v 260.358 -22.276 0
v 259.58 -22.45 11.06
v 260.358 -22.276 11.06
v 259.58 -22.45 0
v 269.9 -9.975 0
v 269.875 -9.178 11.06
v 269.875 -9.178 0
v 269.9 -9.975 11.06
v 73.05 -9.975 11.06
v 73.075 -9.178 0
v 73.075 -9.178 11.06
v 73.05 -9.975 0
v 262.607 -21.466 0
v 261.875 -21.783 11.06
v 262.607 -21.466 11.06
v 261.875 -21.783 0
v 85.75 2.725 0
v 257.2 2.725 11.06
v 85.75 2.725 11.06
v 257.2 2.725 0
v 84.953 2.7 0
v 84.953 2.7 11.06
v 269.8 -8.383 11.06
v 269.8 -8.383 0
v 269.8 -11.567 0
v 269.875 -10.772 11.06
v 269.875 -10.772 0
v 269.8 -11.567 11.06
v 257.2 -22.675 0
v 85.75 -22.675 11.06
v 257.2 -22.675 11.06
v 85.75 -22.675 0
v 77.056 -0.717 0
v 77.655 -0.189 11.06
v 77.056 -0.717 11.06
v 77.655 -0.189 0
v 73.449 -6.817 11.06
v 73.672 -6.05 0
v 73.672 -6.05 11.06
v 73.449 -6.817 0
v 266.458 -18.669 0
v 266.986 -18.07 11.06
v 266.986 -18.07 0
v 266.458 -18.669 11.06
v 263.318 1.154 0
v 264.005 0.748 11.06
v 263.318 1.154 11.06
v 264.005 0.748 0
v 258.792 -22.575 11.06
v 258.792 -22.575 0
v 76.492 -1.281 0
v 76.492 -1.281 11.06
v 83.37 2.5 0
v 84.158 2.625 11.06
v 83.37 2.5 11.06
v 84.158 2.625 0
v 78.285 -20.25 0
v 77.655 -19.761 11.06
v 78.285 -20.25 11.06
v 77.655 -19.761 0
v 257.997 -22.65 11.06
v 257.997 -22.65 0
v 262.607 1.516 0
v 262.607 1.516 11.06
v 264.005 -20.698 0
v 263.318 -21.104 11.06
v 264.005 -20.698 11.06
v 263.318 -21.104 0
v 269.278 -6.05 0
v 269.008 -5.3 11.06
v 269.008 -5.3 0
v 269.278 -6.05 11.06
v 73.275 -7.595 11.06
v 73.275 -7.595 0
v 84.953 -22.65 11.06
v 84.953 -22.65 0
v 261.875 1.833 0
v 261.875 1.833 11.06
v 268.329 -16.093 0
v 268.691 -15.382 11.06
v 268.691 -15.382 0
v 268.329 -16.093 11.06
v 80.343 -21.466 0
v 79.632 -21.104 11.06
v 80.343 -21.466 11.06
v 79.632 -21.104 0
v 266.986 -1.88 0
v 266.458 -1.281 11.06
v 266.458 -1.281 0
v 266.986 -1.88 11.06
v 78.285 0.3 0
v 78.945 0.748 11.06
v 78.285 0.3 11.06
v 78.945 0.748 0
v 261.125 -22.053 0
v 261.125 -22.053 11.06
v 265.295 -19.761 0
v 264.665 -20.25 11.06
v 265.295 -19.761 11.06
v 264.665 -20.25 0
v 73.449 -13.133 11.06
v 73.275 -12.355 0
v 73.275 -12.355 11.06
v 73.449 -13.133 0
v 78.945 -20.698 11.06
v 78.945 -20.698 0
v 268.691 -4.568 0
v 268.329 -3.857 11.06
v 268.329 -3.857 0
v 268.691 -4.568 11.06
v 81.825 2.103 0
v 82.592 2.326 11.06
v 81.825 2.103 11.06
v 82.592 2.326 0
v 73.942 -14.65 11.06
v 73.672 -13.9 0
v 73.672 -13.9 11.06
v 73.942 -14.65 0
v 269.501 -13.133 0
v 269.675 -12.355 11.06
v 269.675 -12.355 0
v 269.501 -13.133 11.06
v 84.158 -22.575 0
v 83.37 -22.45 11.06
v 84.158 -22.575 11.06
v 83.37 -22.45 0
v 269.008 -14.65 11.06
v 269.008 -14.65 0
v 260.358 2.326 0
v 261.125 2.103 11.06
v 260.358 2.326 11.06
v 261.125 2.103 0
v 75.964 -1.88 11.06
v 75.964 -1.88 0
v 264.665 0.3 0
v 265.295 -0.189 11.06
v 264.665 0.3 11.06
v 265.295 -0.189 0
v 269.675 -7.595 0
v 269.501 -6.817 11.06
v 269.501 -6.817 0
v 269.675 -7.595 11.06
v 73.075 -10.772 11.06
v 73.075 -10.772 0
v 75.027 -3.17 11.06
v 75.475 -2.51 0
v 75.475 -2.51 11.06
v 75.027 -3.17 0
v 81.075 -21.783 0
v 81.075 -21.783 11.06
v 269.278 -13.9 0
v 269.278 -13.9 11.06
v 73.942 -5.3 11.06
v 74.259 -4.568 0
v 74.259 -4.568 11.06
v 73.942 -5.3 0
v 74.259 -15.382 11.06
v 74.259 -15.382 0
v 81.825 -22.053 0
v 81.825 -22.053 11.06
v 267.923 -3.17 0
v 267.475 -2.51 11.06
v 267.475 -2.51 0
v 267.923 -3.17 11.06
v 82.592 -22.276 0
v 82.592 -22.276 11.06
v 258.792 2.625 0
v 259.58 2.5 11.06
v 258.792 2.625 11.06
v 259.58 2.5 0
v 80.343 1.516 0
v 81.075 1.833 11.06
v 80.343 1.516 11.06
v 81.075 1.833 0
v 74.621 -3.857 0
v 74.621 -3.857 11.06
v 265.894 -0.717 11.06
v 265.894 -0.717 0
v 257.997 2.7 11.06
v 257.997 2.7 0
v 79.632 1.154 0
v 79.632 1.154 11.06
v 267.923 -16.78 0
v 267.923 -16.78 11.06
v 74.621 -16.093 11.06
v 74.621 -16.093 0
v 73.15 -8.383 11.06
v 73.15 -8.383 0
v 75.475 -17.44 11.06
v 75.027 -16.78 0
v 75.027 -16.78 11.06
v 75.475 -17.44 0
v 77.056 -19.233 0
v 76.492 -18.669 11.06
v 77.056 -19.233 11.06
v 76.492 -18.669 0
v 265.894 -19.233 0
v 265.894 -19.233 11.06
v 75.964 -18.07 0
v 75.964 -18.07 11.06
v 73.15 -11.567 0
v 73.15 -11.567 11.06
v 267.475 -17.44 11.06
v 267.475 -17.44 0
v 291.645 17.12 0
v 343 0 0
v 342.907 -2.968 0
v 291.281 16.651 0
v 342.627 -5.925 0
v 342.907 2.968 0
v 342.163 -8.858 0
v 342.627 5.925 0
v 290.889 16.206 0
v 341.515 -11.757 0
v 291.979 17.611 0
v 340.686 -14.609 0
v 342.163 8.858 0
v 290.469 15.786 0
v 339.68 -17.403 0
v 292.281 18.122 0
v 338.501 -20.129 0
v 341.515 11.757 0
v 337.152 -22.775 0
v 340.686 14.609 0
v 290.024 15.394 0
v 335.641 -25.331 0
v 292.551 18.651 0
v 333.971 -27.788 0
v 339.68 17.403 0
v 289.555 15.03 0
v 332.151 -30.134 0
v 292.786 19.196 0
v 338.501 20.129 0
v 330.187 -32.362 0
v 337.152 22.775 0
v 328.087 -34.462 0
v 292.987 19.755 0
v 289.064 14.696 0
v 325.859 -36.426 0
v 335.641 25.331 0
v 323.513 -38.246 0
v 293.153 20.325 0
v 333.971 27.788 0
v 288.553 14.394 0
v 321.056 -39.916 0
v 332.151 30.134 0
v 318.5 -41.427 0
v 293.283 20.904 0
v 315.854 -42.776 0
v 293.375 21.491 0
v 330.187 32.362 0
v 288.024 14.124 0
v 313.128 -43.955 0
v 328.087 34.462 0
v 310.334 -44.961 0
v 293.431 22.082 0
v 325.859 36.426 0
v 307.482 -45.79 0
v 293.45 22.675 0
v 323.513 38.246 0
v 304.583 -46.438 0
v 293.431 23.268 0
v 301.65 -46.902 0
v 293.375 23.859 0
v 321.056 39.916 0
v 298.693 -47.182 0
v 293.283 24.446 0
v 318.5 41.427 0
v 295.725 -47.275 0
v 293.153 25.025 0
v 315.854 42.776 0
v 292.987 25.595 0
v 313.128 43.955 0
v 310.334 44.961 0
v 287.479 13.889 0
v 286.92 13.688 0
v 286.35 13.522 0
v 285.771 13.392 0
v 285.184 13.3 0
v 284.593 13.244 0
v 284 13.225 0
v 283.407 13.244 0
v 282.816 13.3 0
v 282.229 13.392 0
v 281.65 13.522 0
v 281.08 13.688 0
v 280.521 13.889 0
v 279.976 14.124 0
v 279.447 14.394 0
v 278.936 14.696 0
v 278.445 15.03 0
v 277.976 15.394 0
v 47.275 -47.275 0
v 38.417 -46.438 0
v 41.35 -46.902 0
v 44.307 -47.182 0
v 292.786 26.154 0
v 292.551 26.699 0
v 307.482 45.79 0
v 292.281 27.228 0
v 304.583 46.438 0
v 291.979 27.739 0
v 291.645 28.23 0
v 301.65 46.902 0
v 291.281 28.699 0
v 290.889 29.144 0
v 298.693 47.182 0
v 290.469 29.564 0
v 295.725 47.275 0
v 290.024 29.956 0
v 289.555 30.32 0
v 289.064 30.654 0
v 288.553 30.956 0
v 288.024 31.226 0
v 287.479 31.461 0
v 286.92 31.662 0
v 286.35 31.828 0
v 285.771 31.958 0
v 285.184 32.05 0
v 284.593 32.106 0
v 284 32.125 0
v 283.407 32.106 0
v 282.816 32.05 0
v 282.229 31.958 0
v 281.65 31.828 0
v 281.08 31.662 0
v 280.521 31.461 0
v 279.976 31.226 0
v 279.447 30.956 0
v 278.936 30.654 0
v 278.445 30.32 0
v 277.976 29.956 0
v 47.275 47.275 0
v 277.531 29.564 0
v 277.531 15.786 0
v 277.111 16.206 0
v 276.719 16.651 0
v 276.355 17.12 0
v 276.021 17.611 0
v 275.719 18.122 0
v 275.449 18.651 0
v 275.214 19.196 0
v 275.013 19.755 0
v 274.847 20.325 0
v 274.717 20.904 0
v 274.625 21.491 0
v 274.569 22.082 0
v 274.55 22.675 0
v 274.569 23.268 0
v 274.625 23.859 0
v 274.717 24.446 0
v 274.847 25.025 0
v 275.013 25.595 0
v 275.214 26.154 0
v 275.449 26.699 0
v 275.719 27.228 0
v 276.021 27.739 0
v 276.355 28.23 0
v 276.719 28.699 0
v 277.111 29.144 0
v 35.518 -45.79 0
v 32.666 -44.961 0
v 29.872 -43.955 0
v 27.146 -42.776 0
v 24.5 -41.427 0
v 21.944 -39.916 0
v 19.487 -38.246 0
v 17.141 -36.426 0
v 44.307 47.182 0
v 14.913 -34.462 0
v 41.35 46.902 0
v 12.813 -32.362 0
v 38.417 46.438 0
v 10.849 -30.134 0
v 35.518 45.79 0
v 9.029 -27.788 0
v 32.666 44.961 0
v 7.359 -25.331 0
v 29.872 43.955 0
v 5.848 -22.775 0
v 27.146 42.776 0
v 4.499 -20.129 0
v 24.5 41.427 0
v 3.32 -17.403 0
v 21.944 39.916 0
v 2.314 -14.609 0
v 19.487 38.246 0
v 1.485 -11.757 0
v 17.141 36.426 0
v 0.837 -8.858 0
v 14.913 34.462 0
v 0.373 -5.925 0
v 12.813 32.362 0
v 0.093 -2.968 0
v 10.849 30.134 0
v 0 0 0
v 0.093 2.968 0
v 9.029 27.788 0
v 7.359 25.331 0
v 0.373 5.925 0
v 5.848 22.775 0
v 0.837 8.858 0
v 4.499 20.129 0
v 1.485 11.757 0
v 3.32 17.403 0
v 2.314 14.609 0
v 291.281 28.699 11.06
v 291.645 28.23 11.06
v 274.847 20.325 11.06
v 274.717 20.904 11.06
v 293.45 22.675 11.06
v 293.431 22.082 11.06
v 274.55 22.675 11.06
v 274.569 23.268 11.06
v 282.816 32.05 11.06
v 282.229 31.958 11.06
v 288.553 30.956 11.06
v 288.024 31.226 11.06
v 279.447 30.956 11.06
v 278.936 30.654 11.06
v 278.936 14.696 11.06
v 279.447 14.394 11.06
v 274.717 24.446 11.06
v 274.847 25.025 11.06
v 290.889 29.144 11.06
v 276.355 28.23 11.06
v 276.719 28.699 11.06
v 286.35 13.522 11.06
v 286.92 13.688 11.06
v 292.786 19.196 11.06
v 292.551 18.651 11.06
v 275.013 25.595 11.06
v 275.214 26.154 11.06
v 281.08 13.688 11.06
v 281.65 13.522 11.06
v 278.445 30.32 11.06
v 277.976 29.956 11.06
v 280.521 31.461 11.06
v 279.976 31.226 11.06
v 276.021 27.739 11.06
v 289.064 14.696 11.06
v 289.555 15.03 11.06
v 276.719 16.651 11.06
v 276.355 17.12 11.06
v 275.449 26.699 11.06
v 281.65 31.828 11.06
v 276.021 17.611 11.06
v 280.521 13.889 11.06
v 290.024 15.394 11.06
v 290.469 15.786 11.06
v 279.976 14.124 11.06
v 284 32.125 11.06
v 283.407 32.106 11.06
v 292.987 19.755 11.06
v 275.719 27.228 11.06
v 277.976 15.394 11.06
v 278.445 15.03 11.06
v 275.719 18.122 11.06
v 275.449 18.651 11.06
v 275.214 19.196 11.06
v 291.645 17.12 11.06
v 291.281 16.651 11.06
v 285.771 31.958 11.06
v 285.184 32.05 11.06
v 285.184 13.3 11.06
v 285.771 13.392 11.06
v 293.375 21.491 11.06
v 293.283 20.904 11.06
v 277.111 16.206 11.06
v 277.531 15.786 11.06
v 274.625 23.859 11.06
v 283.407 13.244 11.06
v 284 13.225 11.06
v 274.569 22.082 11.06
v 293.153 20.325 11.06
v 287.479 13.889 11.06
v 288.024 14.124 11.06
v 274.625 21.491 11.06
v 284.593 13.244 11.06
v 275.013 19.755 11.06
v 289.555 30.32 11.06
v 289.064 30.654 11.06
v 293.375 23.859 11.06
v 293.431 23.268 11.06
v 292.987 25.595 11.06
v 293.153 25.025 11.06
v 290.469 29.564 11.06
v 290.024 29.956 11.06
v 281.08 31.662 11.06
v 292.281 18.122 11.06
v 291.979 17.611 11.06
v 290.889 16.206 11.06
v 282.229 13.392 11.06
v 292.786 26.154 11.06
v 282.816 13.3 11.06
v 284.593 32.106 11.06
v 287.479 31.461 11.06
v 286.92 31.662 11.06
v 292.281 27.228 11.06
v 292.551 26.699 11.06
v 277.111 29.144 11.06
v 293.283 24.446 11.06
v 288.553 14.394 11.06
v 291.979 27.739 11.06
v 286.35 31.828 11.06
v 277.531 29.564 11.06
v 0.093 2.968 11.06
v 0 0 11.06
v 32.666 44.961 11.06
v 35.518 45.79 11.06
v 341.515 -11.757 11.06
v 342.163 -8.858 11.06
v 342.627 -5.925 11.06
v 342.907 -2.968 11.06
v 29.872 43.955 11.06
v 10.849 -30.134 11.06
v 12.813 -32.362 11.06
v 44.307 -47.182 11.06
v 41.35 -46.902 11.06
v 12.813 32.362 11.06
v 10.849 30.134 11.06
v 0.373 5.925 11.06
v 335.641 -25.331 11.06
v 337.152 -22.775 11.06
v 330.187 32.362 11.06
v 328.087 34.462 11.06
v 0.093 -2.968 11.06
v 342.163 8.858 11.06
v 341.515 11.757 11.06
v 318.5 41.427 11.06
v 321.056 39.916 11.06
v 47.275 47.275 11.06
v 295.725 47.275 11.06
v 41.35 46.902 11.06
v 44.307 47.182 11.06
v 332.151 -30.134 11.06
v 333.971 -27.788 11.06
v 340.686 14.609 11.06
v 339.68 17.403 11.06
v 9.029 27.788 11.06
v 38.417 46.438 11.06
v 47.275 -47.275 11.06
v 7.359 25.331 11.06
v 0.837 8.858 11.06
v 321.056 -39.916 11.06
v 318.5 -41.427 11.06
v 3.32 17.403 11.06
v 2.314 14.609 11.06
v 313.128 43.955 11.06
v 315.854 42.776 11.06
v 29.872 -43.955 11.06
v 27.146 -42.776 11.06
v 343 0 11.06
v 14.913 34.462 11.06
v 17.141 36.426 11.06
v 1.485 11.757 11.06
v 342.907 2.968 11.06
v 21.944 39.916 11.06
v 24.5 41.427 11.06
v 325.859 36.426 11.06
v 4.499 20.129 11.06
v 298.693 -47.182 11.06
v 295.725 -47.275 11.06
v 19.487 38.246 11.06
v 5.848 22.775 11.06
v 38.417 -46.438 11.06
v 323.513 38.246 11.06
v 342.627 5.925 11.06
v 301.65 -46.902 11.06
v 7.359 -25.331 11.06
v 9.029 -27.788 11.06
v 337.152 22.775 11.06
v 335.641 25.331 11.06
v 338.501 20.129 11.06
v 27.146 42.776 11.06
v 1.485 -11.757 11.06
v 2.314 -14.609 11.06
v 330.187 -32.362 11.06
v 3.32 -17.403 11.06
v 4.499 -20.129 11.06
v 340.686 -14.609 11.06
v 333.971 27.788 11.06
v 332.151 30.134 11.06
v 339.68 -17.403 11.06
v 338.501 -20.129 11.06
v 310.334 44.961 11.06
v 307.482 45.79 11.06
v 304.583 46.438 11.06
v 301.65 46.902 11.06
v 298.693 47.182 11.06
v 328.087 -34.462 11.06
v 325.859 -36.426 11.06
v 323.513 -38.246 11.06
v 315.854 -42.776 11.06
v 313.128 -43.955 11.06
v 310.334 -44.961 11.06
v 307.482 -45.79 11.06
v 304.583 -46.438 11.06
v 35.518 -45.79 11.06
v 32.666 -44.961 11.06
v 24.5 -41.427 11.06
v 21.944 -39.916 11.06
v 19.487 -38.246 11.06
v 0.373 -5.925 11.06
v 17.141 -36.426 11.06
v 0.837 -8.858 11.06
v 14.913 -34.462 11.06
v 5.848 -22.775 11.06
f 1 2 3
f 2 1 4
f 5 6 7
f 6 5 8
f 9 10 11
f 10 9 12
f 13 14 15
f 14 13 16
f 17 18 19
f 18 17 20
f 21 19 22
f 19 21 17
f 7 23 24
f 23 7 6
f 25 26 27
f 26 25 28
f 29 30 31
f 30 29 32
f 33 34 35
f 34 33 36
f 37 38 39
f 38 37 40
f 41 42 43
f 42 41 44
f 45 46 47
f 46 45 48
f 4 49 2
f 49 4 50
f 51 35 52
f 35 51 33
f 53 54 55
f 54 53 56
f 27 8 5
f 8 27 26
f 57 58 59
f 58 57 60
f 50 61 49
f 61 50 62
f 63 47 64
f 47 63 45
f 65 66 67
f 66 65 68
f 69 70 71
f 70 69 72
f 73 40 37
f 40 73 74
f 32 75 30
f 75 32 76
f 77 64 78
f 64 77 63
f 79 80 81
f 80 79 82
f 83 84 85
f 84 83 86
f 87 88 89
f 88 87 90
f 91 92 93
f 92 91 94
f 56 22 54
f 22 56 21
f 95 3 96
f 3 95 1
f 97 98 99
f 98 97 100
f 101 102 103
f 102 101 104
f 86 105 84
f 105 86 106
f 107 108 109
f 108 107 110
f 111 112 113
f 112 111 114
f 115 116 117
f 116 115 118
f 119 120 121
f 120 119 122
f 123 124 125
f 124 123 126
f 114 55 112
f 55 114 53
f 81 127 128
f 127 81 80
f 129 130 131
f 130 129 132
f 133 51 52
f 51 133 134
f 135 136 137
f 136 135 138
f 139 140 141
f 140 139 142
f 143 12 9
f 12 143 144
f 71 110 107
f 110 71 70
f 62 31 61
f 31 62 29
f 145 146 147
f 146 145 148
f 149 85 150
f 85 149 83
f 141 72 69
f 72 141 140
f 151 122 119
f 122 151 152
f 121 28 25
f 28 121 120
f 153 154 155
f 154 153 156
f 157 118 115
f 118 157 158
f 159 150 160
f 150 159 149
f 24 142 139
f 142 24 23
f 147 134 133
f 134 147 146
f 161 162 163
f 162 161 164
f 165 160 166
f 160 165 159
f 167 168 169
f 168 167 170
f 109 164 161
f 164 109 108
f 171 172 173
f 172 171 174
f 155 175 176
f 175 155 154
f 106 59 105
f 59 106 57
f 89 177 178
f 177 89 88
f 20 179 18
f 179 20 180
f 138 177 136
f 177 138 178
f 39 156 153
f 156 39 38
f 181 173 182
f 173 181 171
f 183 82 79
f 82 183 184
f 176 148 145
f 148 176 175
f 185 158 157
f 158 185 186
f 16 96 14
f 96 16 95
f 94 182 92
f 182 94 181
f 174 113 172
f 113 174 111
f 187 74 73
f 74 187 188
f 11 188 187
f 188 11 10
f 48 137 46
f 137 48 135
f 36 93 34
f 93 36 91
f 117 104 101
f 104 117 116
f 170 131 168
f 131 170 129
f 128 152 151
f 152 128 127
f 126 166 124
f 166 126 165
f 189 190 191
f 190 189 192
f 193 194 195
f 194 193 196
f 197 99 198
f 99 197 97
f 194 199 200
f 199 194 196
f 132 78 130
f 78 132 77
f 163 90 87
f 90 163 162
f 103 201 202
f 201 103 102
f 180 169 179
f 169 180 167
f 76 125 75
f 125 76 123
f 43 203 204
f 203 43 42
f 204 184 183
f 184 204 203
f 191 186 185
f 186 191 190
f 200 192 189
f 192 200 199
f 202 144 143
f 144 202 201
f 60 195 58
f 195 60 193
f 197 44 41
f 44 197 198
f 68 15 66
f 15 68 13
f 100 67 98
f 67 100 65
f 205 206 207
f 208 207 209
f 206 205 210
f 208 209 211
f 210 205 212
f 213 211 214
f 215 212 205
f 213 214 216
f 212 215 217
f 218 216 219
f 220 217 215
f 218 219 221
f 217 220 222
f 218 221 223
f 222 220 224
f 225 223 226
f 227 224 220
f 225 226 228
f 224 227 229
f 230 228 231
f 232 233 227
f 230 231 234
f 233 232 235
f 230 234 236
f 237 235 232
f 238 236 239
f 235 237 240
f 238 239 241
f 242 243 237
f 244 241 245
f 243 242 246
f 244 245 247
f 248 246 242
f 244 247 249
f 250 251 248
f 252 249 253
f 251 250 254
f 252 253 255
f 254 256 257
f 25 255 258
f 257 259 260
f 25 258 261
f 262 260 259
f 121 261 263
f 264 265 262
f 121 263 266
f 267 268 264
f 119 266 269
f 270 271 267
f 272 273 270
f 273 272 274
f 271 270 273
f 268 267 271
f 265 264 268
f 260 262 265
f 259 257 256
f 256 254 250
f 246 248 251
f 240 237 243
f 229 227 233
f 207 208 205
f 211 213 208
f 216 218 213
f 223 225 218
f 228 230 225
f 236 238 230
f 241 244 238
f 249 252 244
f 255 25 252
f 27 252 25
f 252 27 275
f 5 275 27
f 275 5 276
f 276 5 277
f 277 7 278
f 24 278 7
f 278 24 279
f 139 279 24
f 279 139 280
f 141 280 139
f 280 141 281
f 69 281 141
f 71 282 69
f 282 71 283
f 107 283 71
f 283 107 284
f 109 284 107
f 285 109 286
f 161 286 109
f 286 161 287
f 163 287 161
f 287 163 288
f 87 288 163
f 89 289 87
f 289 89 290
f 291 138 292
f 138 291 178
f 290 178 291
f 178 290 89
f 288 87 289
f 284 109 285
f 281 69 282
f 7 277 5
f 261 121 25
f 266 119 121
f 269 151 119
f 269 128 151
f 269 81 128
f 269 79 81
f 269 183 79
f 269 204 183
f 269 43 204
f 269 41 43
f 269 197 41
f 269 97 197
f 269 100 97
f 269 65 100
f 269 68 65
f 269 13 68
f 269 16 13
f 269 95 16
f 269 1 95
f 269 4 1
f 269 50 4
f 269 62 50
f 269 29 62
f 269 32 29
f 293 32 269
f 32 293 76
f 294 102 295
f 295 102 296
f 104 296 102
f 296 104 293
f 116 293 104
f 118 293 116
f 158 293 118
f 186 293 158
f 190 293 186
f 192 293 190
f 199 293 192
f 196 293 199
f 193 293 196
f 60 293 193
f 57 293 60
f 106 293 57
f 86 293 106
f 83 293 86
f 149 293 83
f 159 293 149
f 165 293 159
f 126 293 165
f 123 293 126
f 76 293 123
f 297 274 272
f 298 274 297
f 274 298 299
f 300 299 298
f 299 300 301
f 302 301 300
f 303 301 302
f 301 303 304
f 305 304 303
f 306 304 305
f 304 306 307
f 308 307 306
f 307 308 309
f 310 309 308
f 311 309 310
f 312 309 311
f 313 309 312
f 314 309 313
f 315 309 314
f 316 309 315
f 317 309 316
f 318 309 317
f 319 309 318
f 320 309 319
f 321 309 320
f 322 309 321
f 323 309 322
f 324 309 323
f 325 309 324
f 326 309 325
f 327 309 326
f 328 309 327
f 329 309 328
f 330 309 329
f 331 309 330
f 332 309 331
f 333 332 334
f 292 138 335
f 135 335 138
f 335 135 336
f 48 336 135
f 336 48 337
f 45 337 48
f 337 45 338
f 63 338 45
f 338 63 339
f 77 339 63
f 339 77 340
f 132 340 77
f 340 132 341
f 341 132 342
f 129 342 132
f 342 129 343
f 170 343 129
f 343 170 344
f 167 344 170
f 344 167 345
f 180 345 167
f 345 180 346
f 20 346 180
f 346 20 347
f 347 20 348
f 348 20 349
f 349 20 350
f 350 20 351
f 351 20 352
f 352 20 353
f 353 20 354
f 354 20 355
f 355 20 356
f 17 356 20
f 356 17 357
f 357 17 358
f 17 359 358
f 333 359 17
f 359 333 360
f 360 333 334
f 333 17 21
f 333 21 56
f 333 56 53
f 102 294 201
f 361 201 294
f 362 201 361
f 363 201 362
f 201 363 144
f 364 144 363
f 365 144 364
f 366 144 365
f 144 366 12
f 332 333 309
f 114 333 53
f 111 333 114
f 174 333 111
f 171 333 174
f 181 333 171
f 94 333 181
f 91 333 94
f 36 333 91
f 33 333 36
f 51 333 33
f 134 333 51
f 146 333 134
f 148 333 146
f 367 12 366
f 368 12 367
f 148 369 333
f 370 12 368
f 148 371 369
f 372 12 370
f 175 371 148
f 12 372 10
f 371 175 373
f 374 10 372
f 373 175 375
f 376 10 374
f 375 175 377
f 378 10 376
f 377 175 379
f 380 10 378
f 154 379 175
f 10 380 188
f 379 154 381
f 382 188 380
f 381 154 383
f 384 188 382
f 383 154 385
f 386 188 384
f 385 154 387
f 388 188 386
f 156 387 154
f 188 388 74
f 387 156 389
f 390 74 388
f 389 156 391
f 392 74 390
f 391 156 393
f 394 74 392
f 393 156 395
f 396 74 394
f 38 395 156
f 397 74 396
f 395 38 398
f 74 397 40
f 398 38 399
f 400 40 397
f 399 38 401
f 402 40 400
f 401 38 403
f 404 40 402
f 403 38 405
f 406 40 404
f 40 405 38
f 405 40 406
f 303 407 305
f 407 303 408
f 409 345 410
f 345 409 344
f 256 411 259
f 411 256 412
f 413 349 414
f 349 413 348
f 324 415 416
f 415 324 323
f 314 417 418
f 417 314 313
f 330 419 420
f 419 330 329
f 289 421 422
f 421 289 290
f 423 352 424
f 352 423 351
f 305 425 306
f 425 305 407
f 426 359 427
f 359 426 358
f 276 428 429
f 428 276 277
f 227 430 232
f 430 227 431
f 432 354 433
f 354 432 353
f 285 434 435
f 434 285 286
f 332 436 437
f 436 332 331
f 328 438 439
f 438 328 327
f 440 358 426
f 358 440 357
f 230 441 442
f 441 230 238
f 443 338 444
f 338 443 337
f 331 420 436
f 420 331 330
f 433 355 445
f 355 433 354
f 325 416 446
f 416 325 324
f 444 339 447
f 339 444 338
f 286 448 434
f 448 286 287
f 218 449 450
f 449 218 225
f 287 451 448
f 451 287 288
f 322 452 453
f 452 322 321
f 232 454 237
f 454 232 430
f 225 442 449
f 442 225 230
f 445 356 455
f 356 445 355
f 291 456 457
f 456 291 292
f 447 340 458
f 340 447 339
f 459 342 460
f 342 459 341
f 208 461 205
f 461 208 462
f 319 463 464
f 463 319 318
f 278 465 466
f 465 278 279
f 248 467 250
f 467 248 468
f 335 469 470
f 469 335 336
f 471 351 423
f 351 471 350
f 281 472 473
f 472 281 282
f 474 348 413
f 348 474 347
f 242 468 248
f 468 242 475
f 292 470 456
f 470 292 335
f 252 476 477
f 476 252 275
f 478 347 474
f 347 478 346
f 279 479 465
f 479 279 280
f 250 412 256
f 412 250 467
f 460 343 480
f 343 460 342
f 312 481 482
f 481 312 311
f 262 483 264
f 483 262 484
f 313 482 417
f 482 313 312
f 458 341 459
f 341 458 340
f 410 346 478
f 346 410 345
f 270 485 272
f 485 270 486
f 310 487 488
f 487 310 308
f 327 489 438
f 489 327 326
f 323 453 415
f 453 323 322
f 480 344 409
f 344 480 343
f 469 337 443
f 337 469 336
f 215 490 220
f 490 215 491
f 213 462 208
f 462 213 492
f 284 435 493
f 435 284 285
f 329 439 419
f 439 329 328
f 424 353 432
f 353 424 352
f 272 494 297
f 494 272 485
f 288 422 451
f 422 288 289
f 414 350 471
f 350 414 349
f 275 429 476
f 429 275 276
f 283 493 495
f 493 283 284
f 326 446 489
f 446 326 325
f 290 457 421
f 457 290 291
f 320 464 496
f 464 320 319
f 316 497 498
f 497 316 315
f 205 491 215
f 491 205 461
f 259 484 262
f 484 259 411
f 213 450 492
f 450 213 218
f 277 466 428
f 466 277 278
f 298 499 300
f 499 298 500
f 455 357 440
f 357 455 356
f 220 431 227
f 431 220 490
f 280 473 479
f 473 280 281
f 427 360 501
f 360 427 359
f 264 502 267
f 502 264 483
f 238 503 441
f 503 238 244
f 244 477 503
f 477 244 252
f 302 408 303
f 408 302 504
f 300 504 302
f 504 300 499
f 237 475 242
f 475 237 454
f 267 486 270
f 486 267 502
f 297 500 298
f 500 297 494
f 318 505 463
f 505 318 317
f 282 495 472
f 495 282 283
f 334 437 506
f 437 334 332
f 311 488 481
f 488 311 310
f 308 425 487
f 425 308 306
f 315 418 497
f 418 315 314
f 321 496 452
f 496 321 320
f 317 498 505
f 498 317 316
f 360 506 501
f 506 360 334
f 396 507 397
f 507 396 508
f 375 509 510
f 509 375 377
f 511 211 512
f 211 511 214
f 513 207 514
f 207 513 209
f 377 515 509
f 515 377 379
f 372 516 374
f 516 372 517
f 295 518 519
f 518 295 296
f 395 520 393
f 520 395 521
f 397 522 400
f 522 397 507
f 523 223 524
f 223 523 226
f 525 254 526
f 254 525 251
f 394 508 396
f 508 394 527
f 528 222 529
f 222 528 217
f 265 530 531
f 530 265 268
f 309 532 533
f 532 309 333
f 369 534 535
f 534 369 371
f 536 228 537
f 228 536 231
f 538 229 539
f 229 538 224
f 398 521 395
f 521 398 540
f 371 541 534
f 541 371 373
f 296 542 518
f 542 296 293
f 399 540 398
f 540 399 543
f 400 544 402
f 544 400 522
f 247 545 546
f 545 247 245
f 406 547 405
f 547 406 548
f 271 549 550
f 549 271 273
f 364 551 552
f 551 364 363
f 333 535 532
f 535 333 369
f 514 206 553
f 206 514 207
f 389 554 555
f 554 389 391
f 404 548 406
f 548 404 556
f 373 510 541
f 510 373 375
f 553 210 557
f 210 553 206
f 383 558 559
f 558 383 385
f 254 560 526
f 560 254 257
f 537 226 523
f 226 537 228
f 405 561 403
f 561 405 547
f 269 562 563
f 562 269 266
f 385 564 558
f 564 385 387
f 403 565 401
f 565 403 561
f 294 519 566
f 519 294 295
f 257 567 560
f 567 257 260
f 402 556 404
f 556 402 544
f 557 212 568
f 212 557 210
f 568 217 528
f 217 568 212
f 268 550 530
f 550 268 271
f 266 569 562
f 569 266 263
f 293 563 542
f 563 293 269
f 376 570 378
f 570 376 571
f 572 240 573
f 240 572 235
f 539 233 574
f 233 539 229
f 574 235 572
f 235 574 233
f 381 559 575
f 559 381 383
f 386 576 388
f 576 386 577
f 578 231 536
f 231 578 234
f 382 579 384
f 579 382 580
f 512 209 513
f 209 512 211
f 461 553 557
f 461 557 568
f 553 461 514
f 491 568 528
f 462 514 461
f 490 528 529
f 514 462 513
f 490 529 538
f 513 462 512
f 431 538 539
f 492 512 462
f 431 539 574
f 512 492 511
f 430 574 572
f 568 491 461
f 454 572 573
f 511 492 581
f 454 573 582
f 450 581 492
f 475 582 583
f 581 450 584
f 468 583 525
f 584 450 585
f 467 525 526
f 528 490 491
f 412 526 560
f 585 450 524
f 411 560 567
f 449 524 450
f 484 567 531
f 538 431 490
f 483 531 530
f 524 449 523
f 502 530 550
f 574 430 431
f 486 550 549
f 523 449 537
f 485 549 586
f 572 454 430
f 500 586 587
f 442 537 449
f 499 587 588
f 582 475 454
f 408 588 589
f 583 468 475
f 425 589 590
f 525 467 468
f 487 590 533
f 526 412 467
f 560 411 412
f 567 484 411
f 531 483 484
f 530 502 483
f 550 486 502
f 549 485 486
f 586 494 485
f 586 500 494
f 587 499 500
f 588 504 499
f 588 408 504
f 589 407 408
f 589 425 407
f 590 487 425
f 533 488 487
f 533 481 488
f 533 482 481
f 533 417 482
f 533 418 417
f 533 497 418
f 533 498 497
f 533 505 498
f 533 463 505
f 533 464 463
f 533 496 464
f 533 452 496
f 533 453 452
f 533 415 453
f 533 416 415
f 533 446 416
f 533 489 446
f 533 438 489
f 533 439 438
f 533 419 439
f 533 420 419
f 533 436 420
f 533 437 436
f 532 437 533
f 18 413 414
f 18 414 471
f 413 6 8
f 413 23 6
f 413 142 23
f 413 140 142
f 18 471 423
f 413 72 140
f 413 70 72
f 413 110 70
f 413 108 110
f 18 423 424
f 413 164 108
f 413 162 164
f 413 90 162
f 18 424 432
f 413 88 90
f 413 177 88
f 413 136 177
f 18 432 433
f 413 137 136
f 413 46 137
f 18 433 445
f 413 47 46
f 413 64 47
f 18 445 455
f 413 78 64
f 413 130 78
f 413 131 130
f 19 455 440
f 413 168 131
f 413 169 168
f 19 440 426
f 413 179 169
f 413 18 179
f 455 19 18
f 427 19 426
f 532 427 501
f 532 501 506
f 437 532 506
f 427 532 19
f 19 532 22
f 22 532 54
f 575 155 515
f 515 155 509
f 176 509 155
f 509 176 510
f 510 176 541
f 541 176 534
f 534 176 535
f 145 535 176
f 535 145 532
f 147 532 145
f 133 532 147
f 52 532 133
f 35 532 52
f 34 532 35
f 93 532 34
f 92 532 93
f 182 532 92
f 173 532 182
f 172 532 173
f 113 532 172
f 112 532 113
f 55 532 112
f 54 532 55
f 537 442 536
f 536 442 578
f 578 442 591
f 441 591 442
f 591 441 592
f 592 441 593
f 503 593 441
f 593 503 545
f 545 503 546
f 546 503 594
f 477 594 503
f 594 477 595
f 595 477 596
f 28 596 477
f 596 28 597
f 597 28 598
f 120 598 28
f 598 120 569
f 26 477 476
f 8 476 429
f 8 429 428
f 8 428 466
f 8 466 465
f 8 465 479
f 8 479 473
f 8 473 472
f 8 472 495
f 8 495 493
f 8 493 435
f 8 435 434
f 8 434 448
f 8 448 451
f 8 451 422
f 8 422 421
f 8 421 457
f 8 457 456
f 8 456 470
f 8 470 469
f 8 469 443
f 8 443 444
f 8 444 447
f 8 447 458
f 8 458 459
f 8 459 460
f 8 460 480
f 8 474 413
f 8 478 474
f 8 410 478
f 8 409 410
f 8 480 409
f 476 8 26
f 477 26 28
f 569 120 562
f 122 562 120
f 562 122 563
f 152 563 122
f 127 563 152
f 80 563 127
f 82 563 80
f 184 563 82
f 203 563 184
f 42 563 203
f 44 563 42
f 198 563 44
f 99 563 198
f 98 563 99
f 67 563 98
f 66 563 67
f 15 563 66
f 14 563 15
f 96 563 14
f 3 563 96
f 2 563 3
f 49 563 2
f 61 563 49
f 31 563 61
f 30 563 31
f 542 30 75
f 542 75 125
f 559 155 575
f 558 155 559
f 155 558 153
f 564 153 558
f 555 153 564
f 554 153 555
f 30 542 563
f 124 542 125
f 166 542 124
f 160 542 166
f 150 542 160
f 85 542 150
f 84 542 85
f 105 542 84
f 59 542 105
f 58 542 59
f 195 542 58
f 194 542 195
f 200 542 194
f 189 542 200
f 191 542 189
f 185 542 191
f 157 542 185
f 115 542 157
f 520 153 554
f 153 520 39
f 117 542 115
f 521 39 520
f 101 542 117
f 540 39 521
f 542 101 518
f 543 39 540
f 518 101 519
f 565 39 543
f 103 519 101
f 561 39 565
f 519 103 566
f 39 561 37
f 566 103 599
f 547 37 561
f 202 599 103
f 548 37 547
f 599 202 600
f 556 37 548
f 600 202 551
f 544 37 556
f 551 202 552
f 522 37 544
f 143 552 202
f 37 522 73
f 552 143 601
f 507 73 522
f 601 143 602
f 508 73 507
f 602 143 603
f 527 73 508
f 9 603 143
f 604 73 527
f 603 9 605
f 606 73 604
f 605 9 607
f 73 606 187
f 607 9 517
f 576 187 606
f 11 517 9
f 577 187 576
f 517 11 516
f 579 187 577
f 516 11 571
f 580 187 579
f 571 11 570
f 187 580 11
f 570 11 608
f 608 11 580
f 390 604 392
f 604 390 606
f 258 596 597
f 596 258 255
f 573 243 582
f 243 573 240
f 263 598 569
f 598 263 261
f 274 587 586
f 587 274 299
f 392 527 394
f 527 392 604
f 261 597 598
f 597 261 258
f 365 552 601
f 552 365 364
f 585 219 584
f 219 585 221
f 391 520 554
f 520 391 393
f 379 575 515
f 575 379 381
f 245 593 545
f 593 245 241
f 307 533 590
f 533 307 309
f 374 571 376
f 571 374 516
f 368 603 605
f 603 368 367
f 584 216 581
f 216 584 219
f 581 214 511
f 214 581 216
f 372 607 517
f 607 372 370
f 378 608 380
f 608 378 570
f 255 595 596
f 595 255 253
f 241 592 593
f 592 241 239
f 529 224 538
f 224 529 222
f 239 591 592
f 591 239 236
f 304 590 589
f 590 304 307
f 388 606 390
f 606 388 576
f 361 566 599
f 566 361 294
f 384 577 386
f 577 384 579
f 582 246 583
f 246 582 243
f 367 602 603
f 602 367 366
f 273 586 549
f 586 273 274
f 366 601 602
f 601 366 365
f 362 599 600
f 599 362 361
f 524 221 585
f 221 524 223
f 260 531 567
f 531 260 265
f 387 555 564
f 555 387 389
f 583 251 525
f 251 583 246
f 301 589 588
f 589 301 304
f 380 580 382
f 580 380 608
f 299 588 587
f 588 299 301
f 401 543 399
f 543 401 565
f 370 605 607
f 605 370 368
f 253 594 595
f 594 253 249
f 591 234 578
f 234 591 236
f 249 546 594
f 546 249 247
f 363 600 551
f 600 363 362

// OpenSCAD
// file: convert.scad
/*
    Library of useful converters.
    note put any constants in constants.scad
*/
include <constants.scad>;

// mmPerInch = 25.4;
// cmPerInch = mmPerInch/10;
// inchesInFoot = 12;
// FeetInInch = 1/inchesInFoot;
//imperial <-> meteric
function convert_ft2in(ft) = ft * inchesInFoot;
function convert_in2ft(in) = in * FeetInInch;
function convert_in2mm(in) = in * mmPerInch;
function convert_ft2mm(ft) = convert_ft2in(ft) * mmPerInch;
// function convert_ft2in(ft) = ft*12;
function convert_mm2Inch(mm) = mm/mmPerInch;
function convertV_mm2Inch(mm) = 
    [
        for(i = [0 : 1 : len(mm)-1]) convert_mm2Inch(mm[i])
    ];

function convert_mm2ft(mm) = convert_in2ft(in = convert_mm2Inch(mm));
function convert_feet2feet(ft) = ft;
function convert_in2in(in) = in;

function convertV_mm2Feet(mm) =
    [
        for(i = [0 : 1 : len(mm)-1]) convert_in2ft(in = convert_mm2Inch(mm[i]))
    ];

function convertVPts_mm2Feet(mm) =
[
    for(i = [0 : 1 : len(mm) - 1]) convertV_mm2Feet(mm = convertV_mm2Feet(mm[i]))
];

function convertVPts_mm2Inch(mm) =
[
    for(i = [0 : 1 : len(mm) - 1]) convertV_mm2Inch(mm = mm[i])
];

function convert_cm2Inch(cm) = convert_mm2Inch(cm) * 10;

function testPass(note, value1, value2) = echo(note = note, input = value1, return = value2) [value1, value2];


Test();

module Test() 
{
    assert(testPass("convert_ft2in", 1, convert_ft2in(1))[1] == inchesInFoot);
    assert(testPass("convert_in2ft", inchesInFoot, convert_in2ft(inchesInFoot))[1] == 1);
    assert(testPass("convert_in2mm", 1, convert_in2mm(1))[1] == mmPerInch);
    // assert(testPass("convert_in2mm", 11.71875, convert_in2mm(11.71875))[1] ==  297.656);
    assert(testPass("convert_mm2Inch", mmPerInch, convert_mm2Inch(mmPerInch))[1] == 1);
    assert(testPass("convert_cm2Inch", cmPerInch, convert_cm2Inch(cmPerInch))[1] == 1);
    assert(testPass("convert_ft2mm", 1, convert_ft2mm(1))[1] == inchesInFoot * mmPerInch);
    // assert(testPass("convert_mm2Feet", mmPerInch * inchesInFoot, convert_mm2Feet(mm = mmPerInch * inchesInFoot))[1] == 1);
}
// file: constants.scad
/*
lib for common constants;
i.e. enums
*/
//machine values
NozzleWidth = 0.6;
LayerHeight = 0.4;
InitialLayerHeight = 0.2;
ISDEBUGEMODE = false;
IS_DEBUG_DEBUG = false;

// test();
// module test(args) {
//  echo(LayersToHeight = LayersToHeight(16));
// }

//puts a foot scale on X and Y axis for point of reference.
module scale(size = 24, increment = convert_in2mm(1), fontsize = 12)
{
  if($preview)
  {
    for (i=[-size:size]) 
    {
        translate([f(i, increment), 0, 0])
        color("red", 0.5)
        union()
        {
            text(text = str(i), size = fontsize);
            rotate([90,0])
            cylinder(r=0.5, h=f(1, increment), center=true);
        }

        translate([0, f(i, increment), 0])
        color("green", 0.5)
        union()
        {
            text(text = str(i), size = fontsize);
            rotate([0,90])
            cylinder(r=0.5, h=f(1, increment), center=true);
        }   
    }     
  }
}

module properties_echo(property)
{
  echo(parent_module(1));
  debugEcho(property.x, property, true);
  echo();
}

module debug_callstack()
{
  echo(parent = parent_module(2), child = parent_module(1));
}

function f(i, increment) = i * increment;

function LayersToHeight(layers) = 
  // echo(NozzleWidth = NozzleWidth, InitialLayerHeight = InitialLayerHeight, LayerHeight = LayerHeight) 
  InitialLayerHeight + (LayerHeight * (layers - 1));
function HeightToLayers(height) = (height - InitialLayerHeight)/LayerHeight;

// returns mm for requested wall count based on NozzelWidth.
function WallThickness(wall_line_count = 1) = wall_line_count > 0 ? wall_line_count * NozzleWidth : wall_line_count;

function isVector(args) = args.x != undef;
function isString(x) = 
  x == undef      ? false 
  : str(x) == x   ? true
                  : false;

module debugEcho(lable, args, mode) 
{
  bogus = debugDebug(lable, args, mode);
  if(mode || ISDEBUGEMODE)
  {
    let(foobar = fargsEcho(lable, args));
  }
}

function debugDebug(lable, args, mode) = IS_DEBUG_DEBUG ? echo(debugEcho=lable, args, mode) : "";

function fargsEcho(lable, args) = echo(parent = parent_module(2), child = parent_module(1))
let
(
  doOnce = 
  [
    for (one = [1:1])  
      if (isVector(args))
        for(i = [0 : len(args)-1])
          echo(str(str(lable, " ", i ), ": ", args[i]))
      else echo(str(lable, " : ", args))
  ]
) "";

function type(x)=
(
   x==undef?undef
   : floor(x)==x? "int"
   : ( abs(x)+1>abs(x)?"float"
     : str(x)==x?"str"
     : str(x)=="false"||str(x)=="true"?"bool"
     : (x[0]==x[0])&&len(x)!=undef? "arr" // range below doesn't have len
     : let( s=str(x)
         , s2= split(slice(s,1,-1)," : ")
         )
         s[0]=="[" && s[len(s)-1]=="]"
         && all( [ for(x=s2) isint(int(x)) ] )?"range"
        :"unknown"
    )
);

//enums
enThickness = 0;
enWidth = 1;
enDepth = 1; 
enLength = 2;

enX = 0;
enY = 1;
enZ = 2;

//measurements
mmPerInch = 25.4;
mmPerFoot = 12 * mmPerInch;
cmPerInch = mmPerInch/10;
inchesInFoot = 12;
FeetInInch = 1/inchesInFoot;

//Mounting holes
woodscrewHeadRad = 4.6228;  //Number 8 wood screw head radius
woodscrewThreadRad = 2.1336;    //Number 8 wood screw thread radius
woodscrewHeadHeight = 2.8448;  //Number 8 wood screw head height
HexBitHoleDia = 7.9;            //standard hex bit diameter.

GRK_cabinet_screw_head_dia = 11;
GRK_cabinet_screw_shank_dia = 4.1656;

ziptie_width = 5;
ziptie_thickness = 1.38;

woodScrewShankDiaN_4 = 0.112 * mmPerInch;
woodScrewShankDiaN_5 = 0.125 * mmPerInch;
woodScrewShankDiaN_6 = 0.138 * mmPerInch;
woodScrewShankDiaN_7 = 0.151 * mmPerInch;
woodScrewShankDiaN_8 = 0.164 * mmPerInch;
woodScrewShankDiaN_9 = 0.177 * mmPerInch;
woodScrewShankDiaN_10 = 0.190 * mmPerInch;

CubeFaces = [
  [0,1,2,3],  // bottom
  [4,5,1,0],  // front
  [7,6,5,4],  // top
  [5,6,2,1],  // right
  [6,7,3,2],  // back
  [7,4,0,3]]; // left
// main file
include <constants.scad>;
use <convert.scad>;
$fn=100;

build();

module build() 
{
    dewalt_table_saw_throat_plate();
}

module dewalt_table_saw_throat_plate()
{
    throatplateDimensions = [94.55, 343, 11.06];

    difference()
    {
        //rawplate
        linear_extrude(height = throatplateDimensions.z)
        hull() 
        {
            translate([throatplateDimensions.x/2, 0, 0]) 
            circle(d=throatplateDimensions.x);    
            translate([throatplateDimensions.y - throatplateDimensions.x/2, 0, 0]) 
            circle(d=throatplateDimensions.x);    
        }    

        union()
        {
            //Blade cut
            blade_cut_size = [convert_in2mm(in = 1), convert_in2mm(in = 6.75), throatplateDimensions.z + 1];
            blade_cut_offset_Dimension = [24.6, convert_in2mm(in = 2)];
            finger_hole_dia =18.9;
            finger_hole_offset = [16.5, 59, throatplateDimensions.z + 1];

            translate([(throatplateDimensions.y/2 + blade_cut_offset_Dimension.y/2)/2 - blade_cut_size.x/2, -(throatplateDimensions.x/2 - blade_cut_offset_Dimension.x), 0])
            linear_extrude(blade_cut_size.z)
            hull()
            {
                translate([blade_cut_size.y, blade_cut_size.x/2,0])
                circle(d = blade_cut_size.x);
                translate([0, blade_cut_size.x/2,0])
                circle(d = blade_cut_size.x);
            }

            translate([(throatplateDimensions.y - finger_hole_offset.y), (throatplateDimensions.x/2 - blade_cut_offset_Dimension.x), 0])
            linear_extrude(blade_cut_size.z)
            circle(d=finger_hole_dia);
            
            // //reference markers
            // color("blue")linear_extrude(blade_cut_size.z)
            // union()
            // {
            //     translate([throatplateDimensions.y/2,0,0])
            //     rotate([0,0,90])
            //     square(size=[throatplateDimensions.x, 1], center=true);
            //     translate([throatplateDimensions.y/2,- (throatplateDimensions.x/2 - blade_cut_offset_Dimension.x),0])
            //     square(size=[throatplateDimensions.y, 1], center=true);
            // }

        }
    }

}
